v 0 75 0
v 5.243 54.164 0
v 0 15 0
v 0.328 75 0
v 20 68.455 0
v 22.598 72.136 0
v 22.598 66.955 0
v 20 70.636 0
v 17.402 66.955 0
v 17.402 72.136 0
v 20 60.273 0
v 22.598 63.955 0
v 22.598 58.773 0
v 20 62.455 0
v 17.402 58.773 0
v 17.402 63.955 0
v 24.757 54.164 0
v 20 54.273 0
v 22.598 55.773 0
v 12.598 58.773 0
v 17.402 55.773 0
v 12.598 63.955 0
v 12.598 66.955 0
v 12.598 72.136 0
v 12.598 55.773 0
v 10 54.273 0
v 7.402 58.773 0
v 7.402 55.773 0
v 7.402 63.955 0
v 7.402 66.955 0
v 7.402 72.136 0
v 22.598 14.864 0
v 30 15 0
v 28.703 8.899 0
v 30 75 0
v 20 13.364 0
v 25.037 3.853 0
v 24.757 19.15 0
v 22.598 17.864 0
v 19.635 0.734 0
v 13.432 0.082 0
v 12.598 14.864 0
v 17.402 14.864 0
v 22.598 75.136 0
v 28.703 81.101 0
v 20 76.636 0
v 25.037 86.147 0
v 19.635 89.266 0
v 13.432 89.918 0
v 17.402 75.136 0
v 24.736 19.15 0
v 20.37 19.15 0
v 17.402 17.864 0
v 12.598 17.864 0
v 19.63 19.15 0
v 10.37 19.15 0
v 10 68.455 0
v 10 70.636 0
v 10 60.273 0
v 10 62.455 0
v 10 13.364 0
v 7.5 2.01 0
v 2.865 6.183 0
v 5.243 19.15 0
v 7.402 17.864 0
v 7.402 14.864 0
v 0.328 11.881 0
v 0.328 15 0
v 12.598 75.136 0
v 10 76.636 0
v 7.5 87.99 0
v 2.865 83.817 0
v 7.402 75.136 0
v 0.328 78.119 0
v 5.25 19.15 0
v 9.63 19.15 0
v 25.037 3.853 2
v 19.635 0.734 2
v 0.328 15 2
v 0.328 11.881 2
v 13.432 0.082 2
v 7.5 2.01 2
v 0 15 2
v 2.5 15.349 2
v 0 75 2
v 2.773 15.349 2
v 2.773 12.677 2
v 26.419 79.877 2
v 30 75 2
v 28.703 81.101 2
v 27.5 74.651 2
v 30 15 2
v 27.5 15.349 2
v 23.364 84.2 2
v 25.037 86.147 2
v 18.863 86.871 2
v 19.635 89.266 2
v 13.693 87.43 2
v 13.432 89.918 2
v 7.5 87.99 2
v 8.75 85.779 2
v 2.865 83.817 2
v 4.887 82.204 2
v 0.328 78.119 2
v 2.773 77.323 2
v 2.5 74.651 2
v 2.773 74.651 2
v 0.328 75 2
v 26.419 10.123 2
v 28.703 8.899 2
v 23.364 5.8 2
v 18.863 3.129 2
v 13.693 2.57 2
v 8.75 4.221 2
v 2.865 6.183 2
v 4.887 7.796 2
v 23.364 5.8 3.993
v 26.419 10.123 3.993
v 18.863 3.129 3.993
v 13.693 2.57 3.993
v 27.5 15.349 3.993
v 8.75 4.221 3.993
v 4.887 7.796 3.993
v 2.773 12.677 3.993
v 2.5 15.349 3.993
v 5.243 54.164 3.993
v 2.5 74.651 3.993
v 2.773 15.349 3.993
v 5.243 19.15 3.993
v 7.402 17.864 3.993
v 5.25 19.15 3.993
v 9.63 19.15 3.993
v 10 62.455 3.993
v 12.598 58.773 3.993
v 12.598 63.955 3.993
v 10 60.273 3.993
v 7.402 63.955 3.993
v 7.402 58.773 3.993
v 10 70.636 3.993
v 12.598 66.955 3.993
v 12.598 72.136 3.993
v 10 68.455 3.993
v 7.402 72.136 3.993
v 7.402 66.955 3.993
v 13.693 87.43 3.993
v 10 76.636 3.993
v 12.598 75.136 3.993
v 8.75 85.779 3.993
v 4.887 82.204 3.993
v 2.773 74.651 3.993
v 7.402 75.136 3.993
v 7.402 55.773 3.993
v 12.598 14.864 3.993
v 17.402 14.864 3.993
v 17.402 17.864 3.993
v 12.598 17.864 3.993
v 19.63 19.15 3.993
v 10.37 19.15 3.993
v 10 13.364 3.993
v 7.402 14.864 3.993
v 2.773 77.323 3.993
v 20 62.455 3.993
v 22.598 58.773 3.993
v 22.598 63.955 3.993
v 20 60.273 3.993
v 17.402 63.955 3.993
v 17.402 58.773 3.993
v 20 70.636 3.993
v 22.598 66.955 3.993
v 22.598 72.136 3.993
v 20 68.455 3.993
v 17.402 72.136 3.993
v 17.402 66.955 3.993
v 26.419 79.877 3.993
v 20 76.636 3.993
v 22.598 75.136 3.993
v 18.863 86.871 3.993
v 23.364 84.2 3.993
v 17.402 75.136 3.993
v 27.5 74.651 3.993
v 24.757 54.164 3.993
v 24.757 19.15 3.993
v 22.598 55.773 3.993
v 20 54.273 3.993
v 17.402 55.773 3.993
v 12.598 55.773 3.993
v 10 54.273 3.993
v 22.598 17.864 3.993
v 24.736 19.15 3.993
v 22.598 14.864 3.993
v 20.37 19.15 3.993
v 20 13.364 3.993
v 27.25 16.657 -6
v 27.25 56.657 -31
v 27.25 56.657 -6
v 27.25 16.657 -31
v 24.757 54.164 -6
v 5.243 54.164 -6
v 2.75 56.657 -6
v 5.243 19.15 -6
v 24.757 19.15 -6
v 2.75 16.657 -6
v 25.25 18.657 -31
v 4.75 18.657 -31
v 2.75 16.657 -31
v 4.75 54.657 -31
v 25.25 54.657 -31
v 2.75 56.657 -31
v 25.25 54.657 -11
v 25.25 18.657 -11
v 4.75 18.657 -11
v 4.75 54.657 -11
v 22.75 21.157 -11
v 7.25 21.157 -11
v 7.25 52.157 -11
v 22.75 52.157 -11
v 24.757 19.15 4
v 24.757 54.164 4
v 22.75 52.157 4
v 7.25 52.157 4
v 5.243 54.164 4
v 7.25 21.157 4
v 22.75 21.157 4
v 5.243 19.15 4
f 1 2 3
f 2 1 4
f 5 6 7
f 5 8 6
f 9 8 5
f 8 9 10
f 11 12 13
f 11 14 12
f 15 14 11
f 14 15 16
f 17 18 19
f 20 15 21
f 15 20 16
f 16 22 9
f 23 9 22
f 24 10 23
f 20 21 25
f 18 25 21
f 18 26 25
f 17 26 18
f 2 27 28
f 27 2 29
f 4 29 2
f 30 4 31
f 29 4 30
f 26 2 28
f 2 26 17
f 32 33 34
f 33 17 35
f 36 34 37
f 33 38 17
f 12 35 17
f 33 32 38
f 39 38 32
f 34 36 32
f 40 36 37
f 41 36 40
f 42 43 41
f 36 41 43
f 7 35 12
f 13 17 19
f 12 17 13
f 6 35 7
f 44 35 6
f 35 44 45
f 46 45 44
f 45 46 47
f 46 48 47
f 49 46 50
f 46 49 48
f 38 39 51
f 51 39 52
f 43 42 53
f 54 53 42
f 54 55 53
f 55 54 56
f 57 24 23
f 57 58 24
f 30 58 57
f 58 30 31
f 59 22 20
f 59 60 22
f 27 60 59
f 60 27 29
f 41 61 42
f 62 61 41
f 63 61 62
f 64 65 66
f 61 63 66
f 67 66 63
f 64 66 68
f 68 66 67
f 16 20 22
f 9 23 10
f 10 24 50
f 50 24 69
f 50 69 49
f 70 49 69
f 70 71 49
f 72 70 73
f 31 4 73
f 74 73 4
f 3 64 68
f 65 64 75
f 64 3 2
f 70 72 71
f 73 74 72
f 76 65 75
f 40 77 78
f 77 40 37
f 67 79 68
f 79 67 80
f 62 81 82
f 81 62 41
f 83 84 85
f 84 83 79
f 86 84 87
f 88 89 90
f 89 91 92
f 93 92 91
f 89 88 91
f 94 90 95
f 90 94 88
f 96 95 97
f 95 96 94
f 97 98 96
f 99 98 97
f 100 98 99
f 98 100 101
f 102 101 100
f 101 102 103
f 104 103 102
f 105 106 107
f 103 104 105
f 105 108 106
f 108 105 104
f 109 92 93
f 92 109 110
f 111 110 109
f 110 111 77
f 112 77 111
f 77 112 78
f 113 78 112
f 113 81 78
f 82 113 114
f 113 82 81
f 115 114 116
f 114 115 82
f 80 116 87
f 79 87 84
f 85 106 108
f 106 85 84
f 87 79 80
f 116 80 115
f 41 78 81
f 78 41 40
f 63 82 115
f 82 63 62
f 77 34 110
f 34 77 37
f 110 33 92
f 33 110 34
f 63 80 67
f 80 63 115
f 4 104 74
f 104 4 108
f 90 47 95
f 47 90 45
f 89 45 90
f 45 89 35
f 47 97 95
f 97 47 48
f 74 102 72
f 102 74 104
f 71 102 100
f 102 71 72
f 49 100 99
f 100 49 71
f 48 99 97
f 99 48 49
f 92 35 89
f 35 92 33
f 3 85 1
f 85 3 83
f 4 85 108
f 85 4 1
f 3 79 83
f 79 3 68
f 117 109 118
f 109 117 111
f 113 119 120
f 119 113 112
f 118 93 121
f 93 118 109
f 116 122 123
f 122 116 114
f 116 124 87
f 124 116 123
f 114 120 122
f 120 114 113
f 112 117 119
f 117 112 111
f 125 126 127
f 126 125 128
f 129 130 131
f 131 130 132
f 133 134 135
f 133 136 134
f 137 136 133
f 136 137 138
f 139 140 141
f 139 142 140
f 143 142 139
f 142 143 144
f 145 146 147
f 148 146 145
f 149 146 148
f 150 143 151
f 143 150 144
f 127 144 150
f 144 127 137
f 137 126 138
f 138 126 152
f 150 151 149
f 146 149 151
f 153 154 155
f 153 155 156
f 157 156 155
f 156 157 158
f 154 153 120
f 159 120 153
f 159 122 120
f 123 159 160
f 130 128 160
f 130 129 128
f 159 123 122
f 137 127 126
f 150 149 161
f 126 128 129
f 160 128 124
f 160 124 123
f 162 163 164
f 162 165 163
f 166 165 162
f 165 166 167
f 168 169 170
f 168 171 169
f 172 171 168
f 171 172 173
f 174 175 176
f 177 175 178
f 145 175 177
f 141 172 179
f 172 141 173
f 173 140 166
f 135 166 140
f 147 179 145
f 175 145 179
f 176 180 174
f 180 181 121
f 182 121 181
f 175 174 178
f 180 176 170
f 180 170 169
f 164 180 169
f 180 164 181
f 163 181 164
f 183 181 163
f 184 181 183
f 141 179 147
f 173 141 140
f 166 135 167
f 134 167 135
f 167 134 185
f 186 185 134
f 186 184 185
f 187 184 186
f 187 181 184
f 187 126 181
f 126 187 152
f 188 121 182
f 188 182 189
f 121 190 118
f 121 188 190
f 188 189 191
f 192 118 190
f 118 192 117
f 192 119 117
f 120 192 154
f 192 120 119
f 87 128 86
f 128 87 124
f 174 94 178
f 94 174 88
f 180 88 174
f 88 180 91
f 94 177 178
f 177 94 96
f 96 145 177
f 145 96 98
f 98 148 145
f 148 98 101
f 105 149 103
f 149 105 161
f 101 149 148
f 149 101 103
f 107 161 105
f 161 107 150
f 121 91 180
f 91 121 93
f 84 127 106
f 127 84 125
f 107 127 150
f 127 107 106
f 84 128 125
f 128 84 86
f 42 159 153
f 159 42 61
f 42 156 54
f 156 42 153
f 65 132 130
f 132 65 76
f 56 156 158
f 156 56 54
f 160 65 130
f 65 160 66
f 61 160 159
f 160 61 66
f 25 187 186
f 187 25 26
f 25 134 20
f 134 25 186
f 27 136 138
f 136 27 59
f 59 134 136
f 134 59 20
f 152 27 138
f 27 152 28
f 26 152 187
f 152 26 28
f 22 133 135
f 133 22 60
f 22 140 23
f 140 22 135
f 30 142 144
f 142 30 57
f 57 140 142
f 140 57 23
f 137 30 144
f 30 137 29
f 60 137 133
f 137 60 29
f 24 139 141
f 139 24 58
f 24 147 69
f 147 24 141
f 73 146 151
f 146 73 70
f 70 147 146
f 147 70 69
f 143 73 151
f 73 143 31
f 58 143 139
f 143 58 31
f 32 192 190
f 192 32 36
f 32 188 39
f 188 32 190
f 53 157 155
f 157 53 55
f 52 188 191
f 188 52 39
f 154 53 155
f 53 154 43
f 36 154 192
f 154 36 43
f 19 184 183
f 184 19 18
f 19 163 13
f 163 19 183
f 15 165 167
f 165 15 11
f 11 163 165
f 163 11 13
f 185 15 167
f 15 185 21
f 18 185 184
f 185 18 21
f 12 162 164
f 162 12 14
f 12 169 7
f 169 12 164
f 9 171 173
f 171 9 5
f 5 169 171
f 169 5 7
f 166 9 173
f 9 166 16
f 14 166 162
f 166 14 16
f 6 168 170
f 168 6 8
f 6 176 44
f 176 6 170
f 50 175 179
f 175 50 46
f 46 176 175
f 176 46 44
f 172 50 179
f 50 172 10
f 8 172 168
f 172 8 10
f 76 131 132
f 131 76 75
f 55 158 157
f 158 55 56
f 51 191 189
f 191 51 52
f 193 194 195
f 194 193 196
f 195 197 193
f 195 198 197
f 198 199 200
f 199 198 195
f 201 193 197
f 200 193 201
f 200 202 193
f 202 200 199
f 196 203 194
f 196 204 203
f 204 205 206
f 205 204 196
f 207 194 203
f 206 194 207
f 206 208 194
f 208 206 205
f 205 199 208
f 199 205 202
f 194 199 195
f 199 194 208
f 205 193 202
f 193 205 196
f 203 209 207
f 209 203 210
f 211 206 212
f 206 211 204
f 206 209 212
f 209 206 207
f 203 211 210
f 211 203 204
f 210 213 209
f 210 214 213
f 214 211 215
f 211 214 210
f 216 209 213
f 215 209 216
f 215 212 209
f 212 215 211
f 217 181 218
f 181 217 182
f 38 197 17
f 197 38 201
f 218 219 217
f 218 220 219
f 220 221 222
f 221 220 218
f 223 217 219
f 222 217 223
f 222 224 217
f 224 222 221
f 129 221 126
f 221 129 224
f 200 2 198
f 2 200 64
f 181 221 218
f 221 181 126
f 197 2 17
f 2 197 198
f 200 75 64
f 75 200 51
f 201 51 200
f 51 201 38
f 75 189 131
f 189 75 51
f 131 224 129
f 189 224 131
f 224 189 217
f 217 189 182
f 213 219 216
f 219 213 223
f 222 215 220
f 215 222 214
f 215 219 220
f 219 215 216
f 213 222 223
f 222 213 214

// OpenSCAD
// file: hydration_bladder_dryer_distributor_common.scad
distributorHeadWidth=30;
distributorHeadLength=90;

bottomPartInsetX=2;
bottomPartInsetY=2;

/*
 * Cuts holes in a part that is arranged flat on X/Y plane
 * through a thickness of the z-size.
 */
module holes(columns, rows, dia, partXSize, partYSize, partZSize, 
        holePolySides, enableRotation) {
    // half of the angle for one side (divides 180, not 360)
    // Also note that the same thing CANNOT be done with an
    // if () {} statement here because the value assignment is
    // invisible outside the scope of the if block.
    // See: https://en.wikibooks.org/wiki/OpenSCAD_User_Manual/General#Scope_of_variables
    rotationAngle = (enableRotation) ? 180/holePolySides : 0;
    for (x = [1 : 1 : columns]) {
        // The low-y end starts at 2
        //    row 0 would be on the x-axis
        //    row 1 would be through the end with the spreader points
        // The high-y end stops at holeRows+1 to have the right number of rows.
        //    example: holeRows = 8 -> loops 2-9, so 2,3,4,5,6,7,8,9 == 8 rows
        for (y = [2 : 1 : rows+1]) {
            // The spacing of the rows adds 3 non-rows to start and finish
            //    between the spreader tip "end pieces"
            translate([
                    x*(partXSize/(columns+1)),
                    y*(partYSize/(rows+3)),
                    -overlap]) {
                rotate([0,0,rotationAngle]) {
                    cylinder(d=dia, h=partZSize+overlap*2, $fn=holePolySides);    
                }
            }
        }
    }
}

module diskEndedPlate(width, length, thickness) {
    union() {
        translate([width/2,width/2,0]) 
            cylinder(d=width, h=thickness);
        translate([width/2,length-width/2,0]) 
            cylinder(d=width, h=thickness);
        translate([0,width/2,0]) 
            cube([width, 
                length-width, thickness]);
    }
}
// file: hydration_bladder_dryer_common.scad
// Note: This drives the width of the opening and the tube and must 
// be big enough (e.g. actual + 0.5mm) to prevent an overly tight fit.
blowerPortWidth=15.5;

// This dictates the strength of the tower tube.  It will be printed
// in layers, so this must be thick enough to not be overly fragile.
towerWallThickness=2;

// Outer measurement for the long side of the tube tower on the base
tubeTowerLength=35;

// Outer measurement for the short side of the tube tower on the base
tubeTowerWidth=blowerPortWidth+(towerWallThickness*2);
// file: box_tube_modules.scad
translate([50,0,0]) boxTube(20,35,50,1.5);

boxTubeReduction(20,35,2,0.5,75,20,15,0);

module boxTube(innerX, innerY, height, wallThickness) {
    internalOverlap=0.05;
    difference() {
        cube([innerX+wallThickness*2, innerY+wallThickness*2, height]);
        translate([wallThickness, wallThickness, -internalOverlap]) {
            cube([innerX, innerY, height+internalOverlap*2]);
        }
    }
}


/*
 * Creates a larger box tube into which another can insert
 * and a smaller box tube which would insert into the same
 * size opening as the larger box tube.
 *
 * The reason this is factored out as a module is that it
 * isn't trivial to "glue" the inner and outer boxes 
 * together.  Because this is intended to be used for 3D
 * printing, there must be some tolerance allowed for the
 * inner and outer pieces to actually fit together.  This
 * means the inner dimensions of the insertion box tube
 * must be slightly expanded, but the outer dimensions of
 * the smaller box tube cannot be.  This leaves a gap that
 * must be filled with a strategicly translated 3rd box tube
 * that is big enough to overlap both the inner and outer
 * surfaces of that gap and "glue" it together into the same
 * object, but only where the smaller and larger tubes intersect.
 * 
 * This is sorta how it looks in a cross section.
 *
 *        |             |  <--- inner
 *        |             |
 *      |||             |||
 *      |||             |||
 *      |\               /|
 *      | \             / |  <--- outer
 *      |  \__"glue"___/  |
 *
 * overlap = thin margin added to inner and outer dimensions
 *    to make the object merge with exact sized items in
 *    the model to which the object is returned.
 */
module boxTubeReduction(matedWidth, matedLength, 
        wallThickness, toleranceGap, 
        coreTubeLength, slipInsertionDepth,
        coreToSlipOverlapDepth, overlap) {
    internalOverlap=0.05;
    coreTubeInnerWidth=matedWidth-wallThickness*2;
    coreTubeInnerLength=matedLength-wallThickness*2;
    union() {
        boxTube(matedWidth+toleranceGap*2, 
                matedLength+toleranceGap*2, 
                slipInsertionDepth+coreToSlipOverlapDepth,
                wallThickness);
        // Since expanding the slip tube leaves a gap between it
        // and the outer surface of the core tube, the gap needs
        // to be filled to connect the model.
        // Note: The thickness of this tube is 1 * toleranceGap, 
        // but to overlap both outer and inner tubes, it expanded
        // by internalOverlap * 2 and positioned -1 * internalOverlap
        translate([wallThickness-internalOverlap,
                wallThickness-internalOverlap,
                slipInsertionDepth]) {
            // inner size starts at the core tube outer size (width or length
            // + 2x wall thickness) and is shrunk by 1 x slipTolerance, which is
            // really 2 * 1/2 * slipTolerance (i.e. 1/2 on each side * 2 sides).
            boxTube(matedWidth-internalOverlap*2,
                    matedLength-internalOverlap*2,
                    coreToSlipOverlapDepth,
                    toleranceGap+internalOverlap*2);
        }

        /* Core Part of Tube
         * Note: The slip tube internal size is adjusted by "overlap,"
         * so the core tube position must be centered by positioning at
         * -1 overlap in both X and Y directions.
         * Note: Length of core tube accounts for the slip overlap on both ends
         * and it is positioned lower by the slip overlap on one end.
         */
        translate([wallThickness+toleranceGap-overlap,
                wallThickness+toleranceGap-overlap,
                slipInsertionDepth]) {
            boxTube(coreTubeInnerWidth,
                    coreTubeInnerLength, 
                coreTubeLength,
                wallThickness+overlap);
        }
    }
}
// main file
use <box_tube_modules.scad>
include <hydration_bladder_dryer_common.scad>
include <hydration_bladder_dryer_distributor_common.scad>

renderResolution=10;
roundness = 1;
$fn=15;

overlap=0.007;

// Use this to move the intake port a bit to align it
// between the holes in the bottom plate.
intakeOffsetTuningAdjust=1.15;

distributorHeadHoleDia=6;
holeColumns=2;
holeRows=8;

plateThickness=2;

hullCenterSize=10;

bottomInsertInsetAmount=2;


lowerPlateThickness=2; 

cutoutSides=6;

intakePortHeight=15;

tubeInnerWidth=tubeTowerWidth-towerWallThickness*2;
tubeInnerLength=tubeTowerLength-towerWallThickness*2;

tubeSlipOverlap=5;
tubeSlipHeight=20;

intakeCenteringOffsetX=distributorHeadWidth/2-tubeTowerWidth/2;
intakeOffsetY = distributorHeadLength/5 + intakeOffsetTuningAdjust;

bottomPartInsertWidth=distributorHeadWidth-bottomPartInsetX*2;
bottomPartInsertLength=distributorHeadLength-bottomPartInsetY*2;

bottomPartInsertToleranceGap=0.5;  // mm
bottomPartInsertToleranceScaleX=(bottomPartInsertWidth-2*bottomPartInsertToleranceGap)/
        bottomPartInsertWidth;
bottomPartInsertToleranceScaleY=(bottomPartInsertLength-2*bottomPartInsertToleranceGap)/
        bottomPartInsertLength;
echo(concat("bottomPartInsertToleranceScaleX: ", bottomPartInsertToleranceScaleX));
echo(concat("bottomPartInsertToleranceScaleY: ", bottomPartInsertToleranceScaleY));

union() {
    difference() {
        union() {
            bottomPartSolid();
            translate([bottomPartInsetX+bottomPartInsertToleranceGap,
                    bottomPartInsetY+bottomPartInsertToleranceGap,
                    lowerPlateThickness-overlap]) {
                // Note: Scaling is done here because the raw
                // full-size bottomPartInsertSolid is used to
                // cut out the hole in the other part.
                scale([bottomPartInsertToleranceScaleX,
                        bottomPartInsertToleranceScaleY,1]) {
                    bottomPartInsertSolid();
                }
            }
        }
        // holes
        translate([0,0,-overlap])
            holes(holeColumns, holeRows, distributorHeadHoleDia, distributorHeadWidth, distributorHeadLength, 
                    lowerPlateThickness*2+overlap*2, 6, true);
        // intake opening
        translate([intakeCenteringOffsetX, 
                intakeOffsetY, -overlap])
            cube([tubeTowerWidth-overlap*2,
                tubeTowerLength-overlap*2,
                    lowerPlateThickness*2+overlap*2]);
    }
    slipTolerance=0.5;
    translate([intakeCenteringOffsetX-(towerWallThickness+slipTolerance),
            intakeOffsetY-(towerWallThickness+slipTolerance)+overlap,
            -tubeSlipHeight-intakePortHeight+lowerPlateThickness*2]) {
        boxTubeReduction(tubeTowerWidth,tubeTowerLength,
                towerWallThickness,slipTolerance,
                intakePortHeight,tubeSlipHeight,
                tubeSlipOverlap, overlap);
    }

}

module bottomPartSolid() {
    diskEndedPlate(distributorHeadWidth, distributorHeadLength, lowerPlateThickness);
}

// Note: This is used by the other half to cut the hole for it
//  so it is not reduced yet here.
module bottomPartInsertSolid() {
    diskEndedPlate(bottomPartInsertWidth, 
            bottomPartInsertLength, 
            lowerPlateThickness);
}
